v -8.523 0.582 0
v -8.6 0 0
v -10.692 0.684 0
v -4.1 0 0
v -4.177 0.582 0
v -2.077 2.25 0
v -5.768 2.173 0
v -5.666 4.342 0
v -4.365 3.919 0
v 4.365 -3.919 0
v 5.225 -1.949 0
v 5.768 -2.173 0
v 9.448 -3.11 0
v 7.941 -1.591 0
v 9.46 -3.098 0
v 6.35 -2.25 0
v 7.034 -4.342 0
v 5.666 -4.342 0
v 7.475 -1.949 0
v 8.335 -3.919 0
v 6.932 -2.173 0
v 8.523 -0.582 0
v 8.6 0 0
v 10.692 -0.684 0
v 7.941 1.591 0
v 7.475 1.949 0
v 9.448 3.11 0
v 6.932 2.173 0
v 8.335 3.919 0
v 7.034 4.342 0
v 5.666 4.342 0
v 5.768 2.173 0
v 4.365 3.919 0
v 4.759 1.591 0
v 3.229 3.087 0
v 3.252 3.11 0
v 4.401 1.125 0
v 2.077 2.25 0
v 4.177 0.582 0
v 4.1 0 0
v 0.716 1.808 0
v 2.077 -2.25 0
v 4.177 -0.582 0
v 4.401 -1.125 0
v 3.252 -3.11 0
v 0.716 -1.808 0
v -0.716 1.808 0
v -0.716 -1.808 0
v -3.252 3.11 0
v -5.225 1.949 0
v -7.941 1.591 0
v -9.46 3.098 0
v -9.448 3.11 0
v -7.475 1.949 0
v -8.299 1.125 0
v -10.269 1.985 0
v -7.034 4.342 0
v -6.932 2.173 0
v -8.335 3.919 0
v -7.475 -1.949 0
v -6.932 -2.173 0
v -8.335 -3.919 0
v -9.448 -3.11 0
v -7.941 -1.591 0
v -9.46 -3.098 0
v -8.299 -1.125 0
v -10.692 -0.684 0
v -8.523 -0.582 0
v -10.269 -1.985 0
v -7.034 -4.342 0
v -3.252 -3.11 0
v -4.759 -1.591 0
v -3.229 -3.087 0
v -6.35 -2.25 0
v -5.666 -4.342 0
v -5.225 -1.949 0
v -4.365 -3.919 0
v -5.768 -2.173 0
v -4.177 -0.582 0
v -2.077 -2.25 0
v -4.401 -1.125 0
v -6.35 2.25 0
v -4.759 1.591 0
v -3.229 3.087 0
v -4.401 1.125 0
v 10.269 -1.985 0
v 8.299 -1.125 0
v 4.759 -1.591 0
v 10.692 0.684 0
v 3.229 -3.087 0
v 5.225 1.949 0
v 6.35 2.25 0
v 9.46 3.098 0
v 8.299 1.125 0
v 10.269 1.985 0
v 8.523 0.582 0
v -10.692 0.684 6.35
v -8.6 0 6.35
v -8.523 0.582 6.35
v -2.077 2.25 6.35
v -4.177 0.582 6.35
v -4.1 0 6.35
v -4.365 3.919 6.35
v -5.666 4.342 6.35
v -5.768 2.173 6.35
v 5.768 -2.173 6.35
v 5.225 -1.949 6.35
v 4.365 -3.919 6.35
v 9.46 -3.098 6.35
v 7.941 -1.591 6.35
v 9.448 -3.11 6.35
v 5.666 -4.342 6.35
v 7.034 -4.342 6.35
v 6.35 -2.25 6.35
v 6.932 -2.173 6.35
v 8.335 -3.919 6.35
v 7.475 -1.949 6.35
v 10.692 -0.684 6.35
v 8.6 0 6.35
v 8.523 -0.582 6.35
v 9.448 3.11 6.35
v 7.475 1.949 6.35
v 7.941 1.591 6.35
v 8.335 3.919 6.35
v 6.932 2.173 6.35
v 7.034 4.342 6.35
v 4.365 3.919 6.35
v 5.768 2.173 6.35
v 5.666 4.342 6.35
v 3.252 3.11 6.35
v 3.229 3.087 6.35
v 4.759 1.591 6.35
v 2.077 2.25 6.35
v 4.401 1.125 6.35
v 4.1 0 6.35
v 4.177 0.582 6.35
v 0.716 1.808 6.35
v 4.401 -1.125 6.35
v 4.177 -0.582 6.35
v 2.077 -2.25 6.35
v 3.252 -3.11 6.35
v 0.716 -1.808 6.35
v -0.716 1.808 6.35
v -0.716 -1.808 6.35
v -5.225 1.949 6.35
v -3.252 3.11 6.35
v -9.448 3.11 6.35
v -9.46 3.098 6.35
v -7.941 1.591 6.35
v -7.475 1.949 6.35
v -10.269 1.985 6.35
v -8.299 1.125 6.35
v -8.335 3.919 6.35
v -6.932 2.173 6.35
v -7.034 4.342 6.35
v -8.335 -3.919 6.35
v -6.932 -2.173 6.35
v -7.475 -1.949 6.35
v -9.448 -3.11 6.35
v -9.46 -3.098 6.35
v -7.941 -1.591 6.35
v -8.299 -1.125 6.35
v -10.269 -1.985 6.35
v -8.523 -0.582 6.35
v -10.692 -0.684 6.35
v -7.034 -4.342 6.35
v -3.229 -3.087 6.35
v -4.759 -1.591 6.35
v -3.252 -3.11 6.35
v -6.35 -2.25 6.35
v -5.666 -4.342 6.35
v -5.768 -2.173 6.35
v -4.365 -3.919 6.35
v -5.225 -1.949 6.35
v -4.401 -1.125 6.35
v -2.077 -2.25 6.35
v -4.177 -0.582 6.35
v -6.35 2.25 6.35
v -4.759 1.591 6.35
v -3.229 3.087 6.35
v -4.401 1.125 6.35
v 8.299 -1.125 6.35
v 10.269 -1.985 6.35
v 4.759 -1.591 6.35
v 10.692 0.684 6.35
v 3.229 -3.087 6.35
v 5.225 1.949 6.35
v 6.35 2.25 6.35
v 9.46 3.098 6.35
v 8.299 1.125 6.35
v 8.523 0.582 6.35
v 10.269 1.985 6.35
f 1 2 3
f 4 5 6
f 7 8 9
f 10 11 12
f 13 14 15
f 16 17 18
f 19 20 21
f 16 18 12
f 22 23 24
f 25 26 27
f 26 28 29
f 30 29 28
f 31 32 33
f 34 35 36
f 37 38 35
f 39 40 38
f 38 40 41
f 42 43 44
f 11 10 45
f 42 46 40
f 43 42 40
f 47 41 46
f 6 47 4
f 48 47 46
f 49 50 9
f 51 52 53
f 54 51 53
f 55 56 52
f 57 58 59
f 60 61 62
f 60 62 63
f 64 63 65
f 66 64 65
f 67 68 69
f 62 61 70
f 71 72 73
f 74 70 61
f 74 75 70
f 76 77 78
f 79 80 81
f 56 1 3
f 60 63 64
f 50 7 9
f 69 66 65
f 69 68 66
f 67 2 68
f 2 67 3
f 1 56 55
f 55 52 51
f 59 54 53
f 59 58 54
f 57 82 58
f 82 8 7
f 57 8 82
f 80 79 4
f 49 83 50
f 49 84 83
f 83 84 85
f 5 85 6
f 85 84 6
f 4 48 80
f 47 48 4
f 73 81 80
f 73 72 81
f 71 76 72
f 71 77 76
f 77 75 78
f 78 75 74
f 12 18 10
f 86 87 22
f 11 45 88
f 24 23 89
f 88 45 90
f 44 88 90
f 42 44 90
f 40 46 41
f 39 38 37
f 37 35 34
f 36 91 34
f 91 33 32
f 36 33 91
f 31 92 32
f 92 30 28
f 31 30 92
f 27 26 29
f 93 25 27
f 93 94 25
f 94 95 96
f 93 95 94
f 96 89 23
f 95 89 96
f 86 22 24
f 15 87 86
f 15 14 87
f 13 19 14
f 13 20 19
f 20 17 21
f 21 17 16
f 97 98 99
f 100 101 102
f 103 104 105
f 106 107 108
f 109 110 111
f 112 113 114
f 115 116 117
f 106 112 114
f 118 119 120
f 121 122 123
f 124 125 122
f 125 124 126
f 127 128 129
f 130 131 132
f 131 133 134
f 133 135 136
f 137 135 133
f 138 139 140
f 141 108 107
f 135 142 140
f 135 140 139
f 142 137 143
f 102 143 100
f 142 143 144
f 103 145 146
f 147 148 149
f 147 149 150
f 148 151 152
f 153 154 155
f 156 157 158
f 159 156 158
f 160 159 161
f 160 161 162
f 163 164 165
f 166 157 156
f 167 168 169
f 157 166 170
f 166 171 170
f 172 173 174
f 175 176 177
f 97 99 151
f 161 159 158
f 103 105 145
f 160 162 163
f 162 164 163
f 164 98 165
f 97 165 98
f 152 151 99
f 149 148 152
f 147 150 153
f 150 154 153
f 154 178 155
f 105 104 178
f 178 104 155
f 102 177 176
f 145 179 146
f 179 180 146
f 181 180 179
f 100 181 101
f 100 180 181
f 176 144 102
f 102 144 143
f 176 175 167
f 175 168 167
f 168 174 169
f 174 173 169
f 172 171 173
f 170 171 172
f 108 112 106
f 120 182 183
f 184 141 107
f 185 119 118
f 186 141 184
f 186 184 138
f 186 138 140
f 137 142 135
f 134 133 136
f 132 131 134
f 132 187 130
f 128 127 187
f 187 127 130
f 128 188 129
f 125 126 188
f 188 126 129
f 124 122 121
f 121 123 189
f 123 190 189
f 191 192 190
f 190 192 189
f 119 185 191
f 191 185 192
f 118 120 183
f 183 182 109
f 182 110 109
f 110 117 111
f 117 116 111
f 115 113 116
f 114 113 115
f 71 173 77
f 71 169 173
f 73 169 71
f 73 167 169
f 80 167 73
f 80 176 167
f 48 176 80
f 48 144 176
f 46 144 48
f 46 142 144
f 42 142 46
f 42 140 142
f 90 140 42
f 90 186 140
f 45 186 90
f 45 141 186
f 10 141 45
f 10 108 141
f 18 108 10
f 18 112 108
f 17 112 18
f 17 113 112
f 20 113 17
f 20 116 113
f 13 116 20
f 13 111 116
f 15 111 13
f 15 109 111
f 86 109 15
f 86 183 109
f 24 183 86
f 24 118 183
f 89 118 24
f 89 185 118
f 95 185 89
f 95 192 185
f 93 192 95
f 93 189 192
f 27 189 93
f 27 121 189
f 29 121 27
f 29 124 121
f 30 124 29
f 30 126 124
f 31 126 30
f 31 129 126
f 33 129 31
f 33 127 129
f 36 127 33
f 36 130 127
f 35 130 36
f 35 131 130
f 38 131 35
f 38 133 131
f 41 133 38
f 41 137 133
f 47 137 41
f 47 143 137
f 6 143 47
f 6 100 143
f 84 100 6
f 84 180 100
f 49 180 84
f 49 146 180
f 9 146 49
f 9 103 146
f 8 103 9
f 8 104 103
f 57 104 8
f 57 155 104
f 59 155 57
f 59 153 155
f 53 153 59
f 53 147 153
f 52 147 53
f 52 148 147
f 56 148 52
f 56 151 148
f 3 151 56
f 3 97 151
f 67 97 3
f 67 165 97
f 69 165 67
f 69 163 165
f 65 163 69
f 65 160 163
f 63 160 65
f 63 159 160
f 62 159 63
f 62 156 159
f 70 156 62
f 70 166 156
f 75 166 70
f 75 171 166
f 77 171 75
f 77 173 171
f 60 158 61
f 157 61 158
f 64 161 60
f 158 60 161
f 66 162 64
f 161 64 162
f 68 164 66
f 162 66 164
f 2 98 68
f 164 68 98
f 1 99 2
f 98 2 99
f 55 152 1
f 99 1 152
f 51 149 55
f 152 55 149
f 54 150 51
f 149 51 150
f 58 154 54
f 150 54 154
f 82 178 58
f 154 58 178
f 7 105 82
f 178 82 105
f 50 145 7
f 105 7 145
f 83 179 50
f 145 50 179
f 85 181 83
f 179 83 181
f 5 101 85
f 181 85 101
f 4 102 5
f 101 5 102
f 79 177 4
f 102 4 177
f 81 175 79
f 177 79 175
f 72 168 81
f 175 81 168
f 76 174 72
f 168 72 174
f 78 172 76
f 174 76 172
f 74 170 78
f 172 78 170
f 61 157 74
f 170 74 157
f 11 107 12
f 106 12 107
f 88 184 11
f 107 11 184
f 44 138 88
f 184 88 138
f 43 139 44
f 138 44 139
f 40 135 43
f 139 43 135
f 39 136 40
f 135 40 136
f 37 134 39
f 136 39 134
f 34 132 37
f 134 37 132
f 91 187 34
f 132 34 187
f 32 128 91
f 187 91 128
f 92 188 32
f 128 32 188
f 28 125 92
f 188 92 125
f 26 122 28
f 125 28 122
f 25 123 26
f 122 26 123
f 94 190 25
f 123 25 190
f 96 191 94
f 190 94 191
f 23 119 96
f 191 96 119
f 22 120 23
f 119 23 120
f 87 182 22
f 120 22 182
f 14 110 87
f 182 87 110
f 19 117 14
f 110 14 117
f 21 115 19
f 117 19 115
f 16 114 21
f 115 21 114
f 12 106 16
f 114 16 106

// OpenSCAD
// file: ../lib/TOGComplexLib1.scad
function tcplx1_multiply(a, b) =
	[a[0]*b[0] - a[1]*b[1], a[0]*b[1] + a[1]*b[0]];
function tcplx1_divide(a, b) =
	let(bot = (b[0]*b[0] + b[1]*b[1]))
	[
		(a[0]*b[0] + a[1]*b[1])/bot,
		(a[1]*b[0] - a[0]*b[1])/bot
	];

assert([-11,23] == tcplx1_multiply([3,2], [1,7]));

assert([-1,3] == tcplx1_multiply([3,1], [0,1]));
assert([-1,3] == tcplx1_multiply([0,1], [3,1]));

echo(tcplx1_divide([-1,3], [3,1]));
assert([0,1] == tcplx1_divide([-1,3], [3,1]));

function tcplx1_normalize(vec) =
	let(veclen = sqrt(vec[0]*vec[0]+vec[1]*vec[1]))
	[vec[0] / veclen, vec[1] / veclen];

function tcplx1_relative_turnvec_vv(v0, v1) =
	tcplx1_divide(tcplx1_normalize(v1), tcplx1_normalize(v0));

function tcplx1_relative_turnvec_abc(p0, p1, p2) = tcplx1_relative_turnvec_vv(p1-p0, p2-p1);

// A 90-degree turn
assert([0,1] == tcplx1_relative_turnvec_abc([0,0], [1,0], [1,1]));
assert([0,1] == tcplx1_relative_turnvec_abc([0,0], [0,1], [-1,1]));

// A 45-degree turn
assert(tcplx1_normalize([1,1]) == tcplx1_relative_turnvec_abc([0,0], [1,0], [ 2,1]));
assert(tcplx1_normalize([1,1]) == tcplx1_relative_turnvec_abc([0,0], [0,1], [-1,2]));


function tcplx1_relative_angle_abc(p0, p1, p2) =
	let(turnvec = tcplx1_relative_turnvec_abc(p0, p1, p2))
	atan2(turnvec[1], turnvec[0]);

assert(-135 == tcplx1_relative_angle_abc([0,0], [1,0], [0,-1]));
assert( -90 == tcplx1_relative_angle_abc([0,0], [1,0], [1,-1]));
assert(   0 == tcplx1_relative_angle_abc([0,0], [1,0], [2, 0]));
assert(  90 == tcplx1_relative_angle_abc([0,0], [1,0], [1, 1]));
assert( 135 == tcplx1_relative_angle_abc([0,0], [1,0], [0, 1]));

assert(  90 == tcplx1_relative_angle_abc([1,1], [3,3], [1, 5]));
// file: ../lib/TOGArrayLib1.scad
// TOGArrayLib1.5
// 
// Functions for working with arrays.
// 
// v1.1:
// - tal1_reduce assert(is_list(items)) to prevent infinite recursion
//   when given undefined or other non-list values
// v1.1.1:
// - Fix tal1_uniq_remap_v2 to return "list-remap-result" as the
//   first element of the returned list
// v1.2:
// - Add tal1_replace_at function
// v1.3:
// - tal1_is_vec_of, tal1_is_vec_of_num
// v1.4:
// - tal1_assert_for_each, for when you want to assert something
//   about each of a list of items and get nice failure messages
// v1.5:
// - Add tal1_duplicate_reversed function, which may be
//   handy when generating symmetrical polygons and stuff.

/**
 * Make a list with the contents of list `a`,
 * but starting at offset `off`, replaced by the contents of list `b`.
 * len(result) = max(len(a), off+len(b))
 */
function tal1_replace_at(a, off, b, default_value=undef, default_value_function=undef) =
	assert(is_list(a))
	assert(is_list(b))
	let( _dvf = !is_undef(default_value_function) ? default_value_function : function(i) default_value )
[
	for( i=[0:1:min(off,len(a))-1] ) a[i],
	for( i=[len(a):1:off-1] ) _dvf(i),
	for( i=[off:1:off+len(b)-1] ) b[i-off],
	for( i=[off+len(b):1:len(a)-1] ) a[i],
];

// Simplest case
assert([] == tal1_replace_at([], 0, []));
// Second simplest cases
assert(["foo"] == tal1_replace_at(["foo"], 0, []));
assert(["foo"] == tal1_replace_at([], 0, ["foo"]));
// Replace one item
assert(["foo","quux","baz"] == tal1_replace_at(["foo","bar","baz"], 1, ["quux"]));
// Replace and extend
assert(["foo","quux","tuna","tina"] == tal1_replace_at(["foo","bar","baz"], 1, ["quux", "tuna", "tina"]));
// Add beyond end of `a`
assert(["foo","zzz","quux"] == tal1_replace_at(["foo"], 2, ["quux"], default_value="zzz"));
// Adding 'nothing' should still fill to that point with defaults
assert(["foo","zzz","zzz"] == tal1_replace_at(["foo"], 3, [], default_value="zzz"));


function tal1_reduce(start, items, func, offset=0) =
	assert(is_list(items))
	len(items) == offset ? start :
	tal1_reduce(func(start, items[offset]), items, func, offset+1);

function tal1_consecutive_duplicate_count(items) = tal1_reduce(
	[0, undef],
	items,
	function(z,item) [z[0] + (item == z[1] ? 1 : 0), item]
)[0];

assert(0 == tal1_consecutive_duplicate_count([]));
assert(0 == tal1_consecutive_duplicate_count([50]));
assert(1 == tal1_consecutive_duplicate_count([50,50]));
assert(0 == tal1_consecutive_duplicate_count([50,51,52,53]));
assert(1 == tal1_consecutive_duplicate_count([50,51,52,52]));
assert(3 == tal1_consecutive_duplicate_count([50,50,50,50]));

// Set test_size to arbirarily large values
// to ensure that OpenSCAD can handle heavy recursion
let(test_size=1000) assert(test_size/2 == tal1_consecutive_duplicate_count([for(i=[0:1:test_size-1]) floor(i/2)]));



function tal1_uniq_(items, off0, off1) =
	let(chunklen = off1-off0)
	chunklen == 0 ? [] :
	chunklen == 1 ? [items[off0]] :
	let(half=floor(chunklen/2))
	let(left  = tal1_uniq_(items, off0     , off0+half))
	let(right = tal1_uniq_(items, off0+half, off1     ))
	assert(len(left) > 0)
	assert(len(right) > 0)
	left[len(left)-1] == right[0] ? [each left, for(i=[1:1:len(right)-1]) right[i]] :
	[each left, each right];

/** Given a list of items, returns a new list with identical consecutive items merged */
function tal1_uniq(items) = tal1_uniq_(items, 0, len(items));

assert([] == tal1_uniq([]));
assert([123] == tal1_uniq([123]));
assert([55,0,1,2,3] == tal1_uniq([55,0,1,2,3]));
assert([55,0,1,2] == tal1_uniq([55,0,1,1,2]));
assert([55,0,1] == tal1_uniq([55,55,0,0,0,0,0,0,1,1,1,1]));
assert([55,0] == tal1_uniq([55,0,0,0,0,0,0,0]));



/**
 * Returns [new items, old index -> new index mapping].
 * No-op version.
 */
function tal1_uniq_remap_v1(items) =
	["list-remap-result", items, [for (vi=[0:1:len(items)-1]) vi]];

// [a, a, b, b, c, c]
//
// [a,    ...], []  -> [a],[0]
// [a, a, ...], [0] -> [a],[0,0]

assert([1,2,3] == [1,2,3]);

/**
 * Recursive version that will combine adjacent identical vertexes,
 * but will use the original items.
 */
function tal1_uniq_remap_v2(items, map=[]) =
	let(index = len(map))
	len(items) == index ? ["list-remap-result", items, map] :
	index == 0 ? tal1_uniq_remap_v2(items, [0]) :
	items[index] == items[map[index-1]] ? tal1_uniq_remap_v2(items, [for(vi=map) vi, map[index-1]]) :
	tal1_uniq_remap_v2(items, [for(vi=map) vi, index]);

assert(tal1_uniq_remap_v2([1,1,2,2,3,4]) == ["list-remap-result", [1,1,2,2,3,4], [0,0,2,2,4,5]]);


/**
 * Returns true if `vec` is a list of at least min_len items
 * and component_check(each item, even those beyond min_len) is true.
 */
function tal1_is_vec_of(vec, min_len=0, component_check=function(x) true) =
	assert(is_num(min_len) && min_len >= 0)
	assert(is_function(component_check))
	is_list(vec) && len(vec) >= min_len &&
	tal1_reduce(true, vec, function(prev,item) prev && component_check(item));

function tal1_is_vec_of_num(vec, min_len=0) = tal1_is_vec_of(vec, min_len, function(i) is_num(i));

assert( true == tal1_is_vec_of_num([1,2,3]));
assert( true == tal1_is_vec_of_num([]));
assert( true == tal1_is_vec_of_num([1,2,3], 3));
assert(false == tal1_is_vec_of_num([1,2], 3));
assert(false == tal1_is_vec_of_num([1,2,"spoon"], 3));
// Requirements are ambiguous when
// first min_len items are numbers, but there are non-numeric items afterwards,
// so let's error on the side of saying 'no, it's not a list of numbers';
// i.e. the item check and the min_len are independent.
assert(false == tal1_is_vec_of_num([1,2,3,"artichoke"], 3));


/**
 * Asserts that item_checker(each item in list, index of item)[0] is true.
 * Second element of item_checker return value is assertion message.
 * Returns the original list, in case that's useful to you.
 */
function tal1_assert_for_each(list, item_checker) =
	let( _ignored = [ for(i=[0:1:len(list)-1])
		let(q=item_checker(list[i],i))
		let(passed=is_bool(q) ? q : is_list(q) ? q[0] : assert(false, str(
			"tal1_assert_for_each: item_checker should return Bool|[Bool,String], but returned ",
			q, " for item at index ", i)))
		let(message=is_list(q) ? q[1] : undef)
		assert(passed, message)
		q
	])
	list;

// Callback can return a boolean...
assert([1,2,3] == tal1_assert_for_each([1,2,3], function(v,i) is_num(v)));
// ...or a [boolean, string]
assert([1,2,3] == tal1_assert_for_each([1,2,3], function(v,i) [is_num(v), "element be a num"]));

// [a, b, c] -> [a, b, c, rxf(c), rxf(b), rxf(a)]
function tal1_duplicate_reversed(list, rxf=function(item) item) =
	[
		each list,
		for( i=[len(list)-1 : -1 : 0] ) rxf(list[i]),
	];
// file: ../lib/TOGMod1Constructors.scad
// TOGMod1Constructors-v1.11
// 
// Functions to construct objects understood by TOGMod1
// 
// v1.1:
// - Add togmod1_make_rounded_rect
// v1.2:
// - togmod1_make_rounded_rect can make ovals
// v1.3:
// - togmod1_circle_points, to just get the points of a circle
// - if pos parameter to circle function has a third element,
//   returned vertexes will include it as the z component;
// v1.3.1
// - Some assertions
// v1.4:
// - Refactor togmod1_rounded_rect_points and togmod1_circle_points
//   to use togmod1__make_nd_vector_adder for adapting to whatever
//   `pos` parameter is.
// v1.5:
// - togmod_rounded_rect_points will not simplify completely rounded sides
//   (where length of side is exactly twice the rounding radius)
//   unless simplify_rounded_sides=true
//   - This makes it more useful for polyhedron generation,
//     where radius varies, but number of points must remain constant.
// v1.6:
// - togmod1_make_rect makes a simple rectangle
// - togmod1_make_rounded_rect will defer to togmod1_make_rect when r=0
// v1.7:
// - togmod1_make_circle will return empty shape (["union"]) when d=0
// v1.8:
// - Add togmod1_text
// v1.9:
// - togmod1_circle_points uses 3 as minimum circle point count instead of 6
// v1.10:
// - Fix togmod1_linear_extrude_y so that range corresponds to Y start/end and
//   polygon X,Y correspond to X,Z.  Previously it was rotated wrongly,
//   which would have gone unnoticed for symmetrical shapes centered at 0,0.
// v1.11:
// - Remove an 'echo'

use <./TOGArrayLib1.scad>

function togmod1__make_nd_vector_adder(origin=[0,0]) =
	let(origin_is_zero = tal1_reduce(true, origin, function(prev,item) prev && item == 0))
	origin_is_zero ? (function(vec) len(vec) >= len(origin) ? vec : tal1_replace_at(origin, 0, vec)) :
	function(vec) [
		for(i=[0:1:max(len(origin),len(vec))-1]) (len(vec) > i ? vec[i] : 0) + (len(origin) > i ? origin[i] : 0),
	];

assert([1,2,3] == togmod1__make_nd_vector_adder()([1,2,3]));
assert([1,2,3] == togmod1__make_nd_vector_adder([0,0,3])([1,2]));


function togmod1_make_cuboid(size) =
	assert(is_list(size))
	assert(len(size) >= 3)
	assert(is_num(size[0]))
	assert(is_num(size[1]))
	assert(is_num(size[2]))
	["polyhedron-vf", [
		[-size[0]/2, -size[1]/2, -size[2]/2],
		[+size[0]/2, -size[1]/2, -size[2]/2],
		[-size[0]/2, +size[1]/2, -size[2]/2],
		[+size[0]/2, +size[1]/2, -size[2]/2],
		[-size[0]/2, -size[1]/2, +size[2]/2],
		[+size[0]/2, -size[1]/2, +size[2]/2],
		[-size[0]/2, +size[1]/2, +size[2]/2],
		[+size[0]/2, +size[1]/2, +size[2]/2]
	], [
		[0,1,3,2],[0,4,5,1],[4,6,7,5],[3,7,6,2],[1,5,7,3],[6,4,0,2]
	]];

function togmod1_make_polygon(verts) =
	["polygon-vp", verts, [[for( i=[0:1:len(verts)-1] ) i%len(verts)]]];

function togmod1_rounded_rect_points(size, r, pos=[0,0], simplify_rounded_sides=false) =
	assert(is_list(size))
	assert(len(size) >= 2)
	let(radii = is_list(r) ? r : is_num(r) ? [r,r] : assert(false, "rounded_rect r(adius) should be list<num> or num"))
	let(rx = radii[0])
	let(ry = radii[1])
	assert(is_num(rx))
	assert(is_num(ry))
	assert(size[0] >= 2*rx, str("size[0] must be >= 2*r[0]; size[0] = ",size[0],", 2*r[0] = ",2*rx))
	assert(size[1] >= 2*ry, str("size[1] must be >= 2*r[1]; size[1] = ",size[1],", 2*r[1] = ",2*ry))
	let(quarterfn=max($fn/4, 1))
	let(qfnx = simplify_rounded_sides && size[0] == 2*rx ? quarterfn-1 : quarterfn)
	let(qfny = simplify_rounded_sides && size[1] == 2*ry ? quarterfn-1 : quarterfn)
	let(finalizepos = togmod1__make_nd_vector_adder(pos))
[
	for(a=[0 : 1 : qfnx]) let(ang=      a*90/quarterfn) finalizepos([ size[0]/2-rx + rx*cos(ang),  size[1]/2-ry + ry*sin(ang)]),
	for(a=[0 : 1 : qfny]) let(ang= 90 + a*90/quarterfn) finalizepos([-size[0]/2+rx + rx*cos(ang),  size[1]/2-ry + ry*sin(ang)]),
	for(a=[0 : 1 : qfnx]) let(ang=180 + a*90/quarterfn) finalizepos([-size[0]/2+rx + rx*cos(ang), -size[1]/2+ry + ry*sin(ang)]),
	for(a=[0 : 1 : qfny]) let(ang=270 + a*90/quarterfn) finalizepos([ size[0]/2-rx + rx*cos(ang), -size[1]/2+ry + ry*sin(ang)]),
];

function togmod1_make_rect(size) =
	togmod1_make_polygon([
		[-size[0]/2, -size[1]/2],
		[+size[0]/2, -size[1]/2],
		[+size[0]/2, +size[1]/2],
		[-size[0]/2, +size[1]/2],
	]);

function togmod1_make_rounded_rect(size, r) =
	r == 0 ? togmod1_make_rect(size) :
	togmod1_make_polygon(togmod1_rounded_rect_points(size,r,simplify_rounded_sides=true));

/**
 * Returns points for an approximation of a circle where points are at distance r from pos.
 * Can be used to make other regular polygons, but the faces will be less than that
 * distance from pos (do some trig if you want face distance, e.g. for a hex nut).
 */
function togmod1_circle_points(r, pos=[0,0], d=undef) =
	assert( !is_undef(r) || !is_undef(d) )
	assert(!is_undef(pos[0]))
	assert(!is_undef(pos[1]))
	let(finalizepos = togmod1__make_nd_vector_adder(pos))
	let(r_ = !is_undef(r) ? r : d/2)
	let(fn = max($fn, 3))
	[for(i=[0 : 1 : fn-1]) finalizepos([r_*cos(i*360/fn), r_*sin(i*360/fn)])];

function togmod1_make_circle(r, pos=[0,0], d=undef) =
	r == 0 || d == 0 ? ["union"] :
	togmod1_make_polygon(togmod1_circle_points(r=r, pos=pos, d=d));

function togmod1_make_cylinder(d, zrange=[0,1], r=undef, pos=[0,0]) =
	assert( !is_undef(r) || !is_undef(d) )
	let( r_ = !is_undef(r) ? r : d/2 )
	// TODO: Make polyhedron directly
	["linear-extrude-zs", zrange, togmod1_make_circle(r=r_, pos=pos)];

function togmod1__is_range1d(range) = is_list(range) && len(range) == 2 && is_num(range[0]) && is_num(range[1]);

function togmod1_linear_extrude_z(range, shape) =
	assert(togmod1__is_range1d(range))
	["linear-extrude-zs", range, shape];
function togmod1_linear_extrude_x(range, shape) =
	assert(togmod1__is_range1d(range))
	["rotate", [90, 0, 90], togmod1_linear_extrude_z(range, shape)];
function togmod1_linear_extrude_y(range, shape) =
	assert(togmod1__is_range1d(range))
	["rotate", [90, 0,  0], togmod1_linear_extrude_z([-range[1], -range[0]], shape)];

function togmod1_text(text, size, font, halign, valign, spacing, direction, language, script) =
	["text-tsfhvsdls", text, size, font, halign, valign, spacing, direction, language, script];
// file: ../lib/TOGMod1.scad
// TOGMod1.9
// OpenSCAD library for representing shapes
// 
// See also: Functional OpenSCAD (https://github.com/thehans/FunctionalOpenSCAD)
// 
// v1.8:
// - Add `text-tsfhvsdls`
// v1.9
// - Add `offset-ds` (offset with _d_elta a _s_hape)

module togmod1_domodule(mod) {
	assert(is_list(mod));
	assert(len(mod) > 0);
	if( mod[0] == "polygon-vp" ) {
		// ["polygon-vp", vertexes, paths]
		polygon(points=mod[1], paths=mod[2]);
	} else if( mod[0] == "polyhedron-vf" ) {
		polyhedron(mod[1], faces=mod[2]);
	} else if( mod[0] == "scale" ) {
		assert(len(mod) == 3);
		scale(mod[1]) togmod1_domodule(mod[2]);
	} else if( mod[0] == "translate" ) {
		assert(len(mod) == 3);
		assert(is_list(mod[1]));
		for(c=mod[1]) assert(is_num(c), "translate component should be numeric");
		translate(mod[1]) togmod1_domodule(mod[2]);
	} else if( mod[0] == "rotate" ) {
		assert(len(mod) == 3);
		rotate(mod[1]) togmod1_domodule(mod[2]);
	} else if( mod[0] == "intersection" ) {
		intersection_for( i=[1:1:len(mod)-1] ) togmod1_domodule(mod[i]);
	} else if( mod[0] == "difference" ) {
		difference() {
			togmod1_domodule(mod[1]);
			for( i=[2:1:len(mod)-1] ) togmod1_domodule(mod[i]);
		}
	} else if( mod[0] == "union" ) {
		for( i=[1:1:len(mod)-1] ) togmod1_domodule(mod[i]);
	} else if( mod[0] == "hull" ) {
		hull() for( i=[1:1:len(mod)-1] ) togmod1_domodule(mod[i]);
	} else if( mod[0] == "offset-rs" ) {
		assert(len(mod) == 3);
		assert(is_num(mod[1]));
		assert(is_list(mod[2]));
		offset(mod[1]) togmod1_domodule(mod[2]);
	} else if( mod[0] == "linear-extrude-zs" ) {
		// ["linear-extrude-zs", [z0,z1], 2d_shape] // centered
		// ["linear-extrude-zs", height, 2d_shape]
		let( zrange = is_list(mod[1]) ? mod[1] : [-mod[1]/2, mod[1]/2] ) {
			translate([0,0,zrange[0]]) linear_extrude(zrange[1]-zrange[0]) togmod1_domodule(mod[2]);
		}
	} else if( mod[0] == "render" ) {
		render() togmod1_domodule(mod[1]);
	} else if( mod[0] == "minkowski" ) {
		minkowski() {
			togmod1_domodule(mod[1]);
			togmod1_domodule(mod[2]);
		}
	} else if( mod[0] == "x-debug" ) {
		# togmod1_domodule(mod[1]);
	} else if( mod[0] == "x-color" ) {
		color(mod[1]) togmod1_domodule(mod[2]);
	} else if( mod[0] == "text-tsfhvsdls" ) {
		text(text=mod[1], size=mod[2], font=mod[3], halign=mod[4], valign=mod[5], spacing=mod[6], direction=mod[7], language=mod[7], script=mod[8]);
	} else if( mod[0] == "offset-ds" ) {
		assert(is_num(mod[1]));
		assert(is_list(mod[2]));
		offset(delta=mod[1]) togmod1_domodule(mod[2]);
	} else {
		assert(false, str("Unrecognized shape: ", mod[0]));
	}
}
// main file
// RoundBowtie0.2
// 
// A curvier 'bowtie' piece.
// 
// diamond_r is the distance from the center of the bowtie
// to the center of one of the 'circles'.
// 
// v0.2:
// - Factor out roundbowtie0_make_bowtie_2d

thickness = 6.35;
diamond_r = 6.35;
offset = -0.1;
center_hole_d = 4.5;
$fn = 24;

use <../lib/TOGMod1.scad>
use <../lib/TOGMod1Constructors.scad>
use <../lib/TOGPath1.scad>



function roundbowtie0_make_bowtie_rath__take1(diamond_r, offset) =
let(off2 = offset/sqrt(2))
// As of TOGPath1.100, both round-then-offset and offset-then-round
// approaches are problematic.  Offset-then-round would work
// if all offsets applied before rounding, which would be 'correct',
// but not what it currently does.  So apply offsets manually:
let(corner_ops = [["round", diamond_r/sqrt(2) + offset]])
["togpath1-rath",
	for(v = [
		[ 0     , 0-off2],
		[ 1     ,-1-off2],
		[ 2+off2, 0     ],
		[ 1     , 1+off2],
		[ 0     , 0+off2],
		[-1     , 1+off2],
		[-2-off2, 0     ],
		[-1     ,-1-off2],
	])	["togpath1-rathnode", v * diamond_r, each corner_ops]
];

function roundbowtie0_make_bowtie_rath(diamond_r, offset) =
// Take 2:
// 0.7 is intentionally chosen as it is slightly less than sqrt(2),
// which avoids funkiness at 'seams' between roundings when offset is negative.
// togpath1_rath_to_polypoints could theoretically handle this better,
// but as of v1.100 it doesn't, hence workarounds like this:
//let(actual_rounding_r = diamond_r*0.7)
// 
// Take 3:
// A more 'scalable' adjustment: adding offset/diamond_r seems to do the job:
let(actual_rounding_r = diamond_r*0.707 + min(0,offset/diamond_r))
let(corner_ops = [["round", actual_rounding_r], ["offset", offset]])
["togpath1-rath",
	for(v = [
		[ 0, 0],
		[ 1,-1],
		[ 2, 0],
		[ 1, 1],
		[ 0, 0],
		[-1, 1],
		[-2, 0],
		[-1,-1],
	])	["togpath1-rathnode", v * diamond_r, each corner_ops]
];

function roundbowtie0_make_bowtie_2d(diamond_r, offset=0, center_hole_d=0) =
   let( hole = togmod1_make_circle(d=center_hole_d) )
	["difference",
		togmod1_make_polygon(togpath1_rath_to_polypoints(
			roundbowtie0_make_bowtie_rath(diamond_r, offset)
		)),
		
		for( xm=[-1,1] ) ["translate", [xm*diamond_r,0,0], hole],
	];

togmod1_domodule(
	togmod1_linear_extrude_z([0, thickness], roundbowtie0_make_bowtie_2d(diamond_r, offset=offset, center_hole_d=center_hole_d))
);
